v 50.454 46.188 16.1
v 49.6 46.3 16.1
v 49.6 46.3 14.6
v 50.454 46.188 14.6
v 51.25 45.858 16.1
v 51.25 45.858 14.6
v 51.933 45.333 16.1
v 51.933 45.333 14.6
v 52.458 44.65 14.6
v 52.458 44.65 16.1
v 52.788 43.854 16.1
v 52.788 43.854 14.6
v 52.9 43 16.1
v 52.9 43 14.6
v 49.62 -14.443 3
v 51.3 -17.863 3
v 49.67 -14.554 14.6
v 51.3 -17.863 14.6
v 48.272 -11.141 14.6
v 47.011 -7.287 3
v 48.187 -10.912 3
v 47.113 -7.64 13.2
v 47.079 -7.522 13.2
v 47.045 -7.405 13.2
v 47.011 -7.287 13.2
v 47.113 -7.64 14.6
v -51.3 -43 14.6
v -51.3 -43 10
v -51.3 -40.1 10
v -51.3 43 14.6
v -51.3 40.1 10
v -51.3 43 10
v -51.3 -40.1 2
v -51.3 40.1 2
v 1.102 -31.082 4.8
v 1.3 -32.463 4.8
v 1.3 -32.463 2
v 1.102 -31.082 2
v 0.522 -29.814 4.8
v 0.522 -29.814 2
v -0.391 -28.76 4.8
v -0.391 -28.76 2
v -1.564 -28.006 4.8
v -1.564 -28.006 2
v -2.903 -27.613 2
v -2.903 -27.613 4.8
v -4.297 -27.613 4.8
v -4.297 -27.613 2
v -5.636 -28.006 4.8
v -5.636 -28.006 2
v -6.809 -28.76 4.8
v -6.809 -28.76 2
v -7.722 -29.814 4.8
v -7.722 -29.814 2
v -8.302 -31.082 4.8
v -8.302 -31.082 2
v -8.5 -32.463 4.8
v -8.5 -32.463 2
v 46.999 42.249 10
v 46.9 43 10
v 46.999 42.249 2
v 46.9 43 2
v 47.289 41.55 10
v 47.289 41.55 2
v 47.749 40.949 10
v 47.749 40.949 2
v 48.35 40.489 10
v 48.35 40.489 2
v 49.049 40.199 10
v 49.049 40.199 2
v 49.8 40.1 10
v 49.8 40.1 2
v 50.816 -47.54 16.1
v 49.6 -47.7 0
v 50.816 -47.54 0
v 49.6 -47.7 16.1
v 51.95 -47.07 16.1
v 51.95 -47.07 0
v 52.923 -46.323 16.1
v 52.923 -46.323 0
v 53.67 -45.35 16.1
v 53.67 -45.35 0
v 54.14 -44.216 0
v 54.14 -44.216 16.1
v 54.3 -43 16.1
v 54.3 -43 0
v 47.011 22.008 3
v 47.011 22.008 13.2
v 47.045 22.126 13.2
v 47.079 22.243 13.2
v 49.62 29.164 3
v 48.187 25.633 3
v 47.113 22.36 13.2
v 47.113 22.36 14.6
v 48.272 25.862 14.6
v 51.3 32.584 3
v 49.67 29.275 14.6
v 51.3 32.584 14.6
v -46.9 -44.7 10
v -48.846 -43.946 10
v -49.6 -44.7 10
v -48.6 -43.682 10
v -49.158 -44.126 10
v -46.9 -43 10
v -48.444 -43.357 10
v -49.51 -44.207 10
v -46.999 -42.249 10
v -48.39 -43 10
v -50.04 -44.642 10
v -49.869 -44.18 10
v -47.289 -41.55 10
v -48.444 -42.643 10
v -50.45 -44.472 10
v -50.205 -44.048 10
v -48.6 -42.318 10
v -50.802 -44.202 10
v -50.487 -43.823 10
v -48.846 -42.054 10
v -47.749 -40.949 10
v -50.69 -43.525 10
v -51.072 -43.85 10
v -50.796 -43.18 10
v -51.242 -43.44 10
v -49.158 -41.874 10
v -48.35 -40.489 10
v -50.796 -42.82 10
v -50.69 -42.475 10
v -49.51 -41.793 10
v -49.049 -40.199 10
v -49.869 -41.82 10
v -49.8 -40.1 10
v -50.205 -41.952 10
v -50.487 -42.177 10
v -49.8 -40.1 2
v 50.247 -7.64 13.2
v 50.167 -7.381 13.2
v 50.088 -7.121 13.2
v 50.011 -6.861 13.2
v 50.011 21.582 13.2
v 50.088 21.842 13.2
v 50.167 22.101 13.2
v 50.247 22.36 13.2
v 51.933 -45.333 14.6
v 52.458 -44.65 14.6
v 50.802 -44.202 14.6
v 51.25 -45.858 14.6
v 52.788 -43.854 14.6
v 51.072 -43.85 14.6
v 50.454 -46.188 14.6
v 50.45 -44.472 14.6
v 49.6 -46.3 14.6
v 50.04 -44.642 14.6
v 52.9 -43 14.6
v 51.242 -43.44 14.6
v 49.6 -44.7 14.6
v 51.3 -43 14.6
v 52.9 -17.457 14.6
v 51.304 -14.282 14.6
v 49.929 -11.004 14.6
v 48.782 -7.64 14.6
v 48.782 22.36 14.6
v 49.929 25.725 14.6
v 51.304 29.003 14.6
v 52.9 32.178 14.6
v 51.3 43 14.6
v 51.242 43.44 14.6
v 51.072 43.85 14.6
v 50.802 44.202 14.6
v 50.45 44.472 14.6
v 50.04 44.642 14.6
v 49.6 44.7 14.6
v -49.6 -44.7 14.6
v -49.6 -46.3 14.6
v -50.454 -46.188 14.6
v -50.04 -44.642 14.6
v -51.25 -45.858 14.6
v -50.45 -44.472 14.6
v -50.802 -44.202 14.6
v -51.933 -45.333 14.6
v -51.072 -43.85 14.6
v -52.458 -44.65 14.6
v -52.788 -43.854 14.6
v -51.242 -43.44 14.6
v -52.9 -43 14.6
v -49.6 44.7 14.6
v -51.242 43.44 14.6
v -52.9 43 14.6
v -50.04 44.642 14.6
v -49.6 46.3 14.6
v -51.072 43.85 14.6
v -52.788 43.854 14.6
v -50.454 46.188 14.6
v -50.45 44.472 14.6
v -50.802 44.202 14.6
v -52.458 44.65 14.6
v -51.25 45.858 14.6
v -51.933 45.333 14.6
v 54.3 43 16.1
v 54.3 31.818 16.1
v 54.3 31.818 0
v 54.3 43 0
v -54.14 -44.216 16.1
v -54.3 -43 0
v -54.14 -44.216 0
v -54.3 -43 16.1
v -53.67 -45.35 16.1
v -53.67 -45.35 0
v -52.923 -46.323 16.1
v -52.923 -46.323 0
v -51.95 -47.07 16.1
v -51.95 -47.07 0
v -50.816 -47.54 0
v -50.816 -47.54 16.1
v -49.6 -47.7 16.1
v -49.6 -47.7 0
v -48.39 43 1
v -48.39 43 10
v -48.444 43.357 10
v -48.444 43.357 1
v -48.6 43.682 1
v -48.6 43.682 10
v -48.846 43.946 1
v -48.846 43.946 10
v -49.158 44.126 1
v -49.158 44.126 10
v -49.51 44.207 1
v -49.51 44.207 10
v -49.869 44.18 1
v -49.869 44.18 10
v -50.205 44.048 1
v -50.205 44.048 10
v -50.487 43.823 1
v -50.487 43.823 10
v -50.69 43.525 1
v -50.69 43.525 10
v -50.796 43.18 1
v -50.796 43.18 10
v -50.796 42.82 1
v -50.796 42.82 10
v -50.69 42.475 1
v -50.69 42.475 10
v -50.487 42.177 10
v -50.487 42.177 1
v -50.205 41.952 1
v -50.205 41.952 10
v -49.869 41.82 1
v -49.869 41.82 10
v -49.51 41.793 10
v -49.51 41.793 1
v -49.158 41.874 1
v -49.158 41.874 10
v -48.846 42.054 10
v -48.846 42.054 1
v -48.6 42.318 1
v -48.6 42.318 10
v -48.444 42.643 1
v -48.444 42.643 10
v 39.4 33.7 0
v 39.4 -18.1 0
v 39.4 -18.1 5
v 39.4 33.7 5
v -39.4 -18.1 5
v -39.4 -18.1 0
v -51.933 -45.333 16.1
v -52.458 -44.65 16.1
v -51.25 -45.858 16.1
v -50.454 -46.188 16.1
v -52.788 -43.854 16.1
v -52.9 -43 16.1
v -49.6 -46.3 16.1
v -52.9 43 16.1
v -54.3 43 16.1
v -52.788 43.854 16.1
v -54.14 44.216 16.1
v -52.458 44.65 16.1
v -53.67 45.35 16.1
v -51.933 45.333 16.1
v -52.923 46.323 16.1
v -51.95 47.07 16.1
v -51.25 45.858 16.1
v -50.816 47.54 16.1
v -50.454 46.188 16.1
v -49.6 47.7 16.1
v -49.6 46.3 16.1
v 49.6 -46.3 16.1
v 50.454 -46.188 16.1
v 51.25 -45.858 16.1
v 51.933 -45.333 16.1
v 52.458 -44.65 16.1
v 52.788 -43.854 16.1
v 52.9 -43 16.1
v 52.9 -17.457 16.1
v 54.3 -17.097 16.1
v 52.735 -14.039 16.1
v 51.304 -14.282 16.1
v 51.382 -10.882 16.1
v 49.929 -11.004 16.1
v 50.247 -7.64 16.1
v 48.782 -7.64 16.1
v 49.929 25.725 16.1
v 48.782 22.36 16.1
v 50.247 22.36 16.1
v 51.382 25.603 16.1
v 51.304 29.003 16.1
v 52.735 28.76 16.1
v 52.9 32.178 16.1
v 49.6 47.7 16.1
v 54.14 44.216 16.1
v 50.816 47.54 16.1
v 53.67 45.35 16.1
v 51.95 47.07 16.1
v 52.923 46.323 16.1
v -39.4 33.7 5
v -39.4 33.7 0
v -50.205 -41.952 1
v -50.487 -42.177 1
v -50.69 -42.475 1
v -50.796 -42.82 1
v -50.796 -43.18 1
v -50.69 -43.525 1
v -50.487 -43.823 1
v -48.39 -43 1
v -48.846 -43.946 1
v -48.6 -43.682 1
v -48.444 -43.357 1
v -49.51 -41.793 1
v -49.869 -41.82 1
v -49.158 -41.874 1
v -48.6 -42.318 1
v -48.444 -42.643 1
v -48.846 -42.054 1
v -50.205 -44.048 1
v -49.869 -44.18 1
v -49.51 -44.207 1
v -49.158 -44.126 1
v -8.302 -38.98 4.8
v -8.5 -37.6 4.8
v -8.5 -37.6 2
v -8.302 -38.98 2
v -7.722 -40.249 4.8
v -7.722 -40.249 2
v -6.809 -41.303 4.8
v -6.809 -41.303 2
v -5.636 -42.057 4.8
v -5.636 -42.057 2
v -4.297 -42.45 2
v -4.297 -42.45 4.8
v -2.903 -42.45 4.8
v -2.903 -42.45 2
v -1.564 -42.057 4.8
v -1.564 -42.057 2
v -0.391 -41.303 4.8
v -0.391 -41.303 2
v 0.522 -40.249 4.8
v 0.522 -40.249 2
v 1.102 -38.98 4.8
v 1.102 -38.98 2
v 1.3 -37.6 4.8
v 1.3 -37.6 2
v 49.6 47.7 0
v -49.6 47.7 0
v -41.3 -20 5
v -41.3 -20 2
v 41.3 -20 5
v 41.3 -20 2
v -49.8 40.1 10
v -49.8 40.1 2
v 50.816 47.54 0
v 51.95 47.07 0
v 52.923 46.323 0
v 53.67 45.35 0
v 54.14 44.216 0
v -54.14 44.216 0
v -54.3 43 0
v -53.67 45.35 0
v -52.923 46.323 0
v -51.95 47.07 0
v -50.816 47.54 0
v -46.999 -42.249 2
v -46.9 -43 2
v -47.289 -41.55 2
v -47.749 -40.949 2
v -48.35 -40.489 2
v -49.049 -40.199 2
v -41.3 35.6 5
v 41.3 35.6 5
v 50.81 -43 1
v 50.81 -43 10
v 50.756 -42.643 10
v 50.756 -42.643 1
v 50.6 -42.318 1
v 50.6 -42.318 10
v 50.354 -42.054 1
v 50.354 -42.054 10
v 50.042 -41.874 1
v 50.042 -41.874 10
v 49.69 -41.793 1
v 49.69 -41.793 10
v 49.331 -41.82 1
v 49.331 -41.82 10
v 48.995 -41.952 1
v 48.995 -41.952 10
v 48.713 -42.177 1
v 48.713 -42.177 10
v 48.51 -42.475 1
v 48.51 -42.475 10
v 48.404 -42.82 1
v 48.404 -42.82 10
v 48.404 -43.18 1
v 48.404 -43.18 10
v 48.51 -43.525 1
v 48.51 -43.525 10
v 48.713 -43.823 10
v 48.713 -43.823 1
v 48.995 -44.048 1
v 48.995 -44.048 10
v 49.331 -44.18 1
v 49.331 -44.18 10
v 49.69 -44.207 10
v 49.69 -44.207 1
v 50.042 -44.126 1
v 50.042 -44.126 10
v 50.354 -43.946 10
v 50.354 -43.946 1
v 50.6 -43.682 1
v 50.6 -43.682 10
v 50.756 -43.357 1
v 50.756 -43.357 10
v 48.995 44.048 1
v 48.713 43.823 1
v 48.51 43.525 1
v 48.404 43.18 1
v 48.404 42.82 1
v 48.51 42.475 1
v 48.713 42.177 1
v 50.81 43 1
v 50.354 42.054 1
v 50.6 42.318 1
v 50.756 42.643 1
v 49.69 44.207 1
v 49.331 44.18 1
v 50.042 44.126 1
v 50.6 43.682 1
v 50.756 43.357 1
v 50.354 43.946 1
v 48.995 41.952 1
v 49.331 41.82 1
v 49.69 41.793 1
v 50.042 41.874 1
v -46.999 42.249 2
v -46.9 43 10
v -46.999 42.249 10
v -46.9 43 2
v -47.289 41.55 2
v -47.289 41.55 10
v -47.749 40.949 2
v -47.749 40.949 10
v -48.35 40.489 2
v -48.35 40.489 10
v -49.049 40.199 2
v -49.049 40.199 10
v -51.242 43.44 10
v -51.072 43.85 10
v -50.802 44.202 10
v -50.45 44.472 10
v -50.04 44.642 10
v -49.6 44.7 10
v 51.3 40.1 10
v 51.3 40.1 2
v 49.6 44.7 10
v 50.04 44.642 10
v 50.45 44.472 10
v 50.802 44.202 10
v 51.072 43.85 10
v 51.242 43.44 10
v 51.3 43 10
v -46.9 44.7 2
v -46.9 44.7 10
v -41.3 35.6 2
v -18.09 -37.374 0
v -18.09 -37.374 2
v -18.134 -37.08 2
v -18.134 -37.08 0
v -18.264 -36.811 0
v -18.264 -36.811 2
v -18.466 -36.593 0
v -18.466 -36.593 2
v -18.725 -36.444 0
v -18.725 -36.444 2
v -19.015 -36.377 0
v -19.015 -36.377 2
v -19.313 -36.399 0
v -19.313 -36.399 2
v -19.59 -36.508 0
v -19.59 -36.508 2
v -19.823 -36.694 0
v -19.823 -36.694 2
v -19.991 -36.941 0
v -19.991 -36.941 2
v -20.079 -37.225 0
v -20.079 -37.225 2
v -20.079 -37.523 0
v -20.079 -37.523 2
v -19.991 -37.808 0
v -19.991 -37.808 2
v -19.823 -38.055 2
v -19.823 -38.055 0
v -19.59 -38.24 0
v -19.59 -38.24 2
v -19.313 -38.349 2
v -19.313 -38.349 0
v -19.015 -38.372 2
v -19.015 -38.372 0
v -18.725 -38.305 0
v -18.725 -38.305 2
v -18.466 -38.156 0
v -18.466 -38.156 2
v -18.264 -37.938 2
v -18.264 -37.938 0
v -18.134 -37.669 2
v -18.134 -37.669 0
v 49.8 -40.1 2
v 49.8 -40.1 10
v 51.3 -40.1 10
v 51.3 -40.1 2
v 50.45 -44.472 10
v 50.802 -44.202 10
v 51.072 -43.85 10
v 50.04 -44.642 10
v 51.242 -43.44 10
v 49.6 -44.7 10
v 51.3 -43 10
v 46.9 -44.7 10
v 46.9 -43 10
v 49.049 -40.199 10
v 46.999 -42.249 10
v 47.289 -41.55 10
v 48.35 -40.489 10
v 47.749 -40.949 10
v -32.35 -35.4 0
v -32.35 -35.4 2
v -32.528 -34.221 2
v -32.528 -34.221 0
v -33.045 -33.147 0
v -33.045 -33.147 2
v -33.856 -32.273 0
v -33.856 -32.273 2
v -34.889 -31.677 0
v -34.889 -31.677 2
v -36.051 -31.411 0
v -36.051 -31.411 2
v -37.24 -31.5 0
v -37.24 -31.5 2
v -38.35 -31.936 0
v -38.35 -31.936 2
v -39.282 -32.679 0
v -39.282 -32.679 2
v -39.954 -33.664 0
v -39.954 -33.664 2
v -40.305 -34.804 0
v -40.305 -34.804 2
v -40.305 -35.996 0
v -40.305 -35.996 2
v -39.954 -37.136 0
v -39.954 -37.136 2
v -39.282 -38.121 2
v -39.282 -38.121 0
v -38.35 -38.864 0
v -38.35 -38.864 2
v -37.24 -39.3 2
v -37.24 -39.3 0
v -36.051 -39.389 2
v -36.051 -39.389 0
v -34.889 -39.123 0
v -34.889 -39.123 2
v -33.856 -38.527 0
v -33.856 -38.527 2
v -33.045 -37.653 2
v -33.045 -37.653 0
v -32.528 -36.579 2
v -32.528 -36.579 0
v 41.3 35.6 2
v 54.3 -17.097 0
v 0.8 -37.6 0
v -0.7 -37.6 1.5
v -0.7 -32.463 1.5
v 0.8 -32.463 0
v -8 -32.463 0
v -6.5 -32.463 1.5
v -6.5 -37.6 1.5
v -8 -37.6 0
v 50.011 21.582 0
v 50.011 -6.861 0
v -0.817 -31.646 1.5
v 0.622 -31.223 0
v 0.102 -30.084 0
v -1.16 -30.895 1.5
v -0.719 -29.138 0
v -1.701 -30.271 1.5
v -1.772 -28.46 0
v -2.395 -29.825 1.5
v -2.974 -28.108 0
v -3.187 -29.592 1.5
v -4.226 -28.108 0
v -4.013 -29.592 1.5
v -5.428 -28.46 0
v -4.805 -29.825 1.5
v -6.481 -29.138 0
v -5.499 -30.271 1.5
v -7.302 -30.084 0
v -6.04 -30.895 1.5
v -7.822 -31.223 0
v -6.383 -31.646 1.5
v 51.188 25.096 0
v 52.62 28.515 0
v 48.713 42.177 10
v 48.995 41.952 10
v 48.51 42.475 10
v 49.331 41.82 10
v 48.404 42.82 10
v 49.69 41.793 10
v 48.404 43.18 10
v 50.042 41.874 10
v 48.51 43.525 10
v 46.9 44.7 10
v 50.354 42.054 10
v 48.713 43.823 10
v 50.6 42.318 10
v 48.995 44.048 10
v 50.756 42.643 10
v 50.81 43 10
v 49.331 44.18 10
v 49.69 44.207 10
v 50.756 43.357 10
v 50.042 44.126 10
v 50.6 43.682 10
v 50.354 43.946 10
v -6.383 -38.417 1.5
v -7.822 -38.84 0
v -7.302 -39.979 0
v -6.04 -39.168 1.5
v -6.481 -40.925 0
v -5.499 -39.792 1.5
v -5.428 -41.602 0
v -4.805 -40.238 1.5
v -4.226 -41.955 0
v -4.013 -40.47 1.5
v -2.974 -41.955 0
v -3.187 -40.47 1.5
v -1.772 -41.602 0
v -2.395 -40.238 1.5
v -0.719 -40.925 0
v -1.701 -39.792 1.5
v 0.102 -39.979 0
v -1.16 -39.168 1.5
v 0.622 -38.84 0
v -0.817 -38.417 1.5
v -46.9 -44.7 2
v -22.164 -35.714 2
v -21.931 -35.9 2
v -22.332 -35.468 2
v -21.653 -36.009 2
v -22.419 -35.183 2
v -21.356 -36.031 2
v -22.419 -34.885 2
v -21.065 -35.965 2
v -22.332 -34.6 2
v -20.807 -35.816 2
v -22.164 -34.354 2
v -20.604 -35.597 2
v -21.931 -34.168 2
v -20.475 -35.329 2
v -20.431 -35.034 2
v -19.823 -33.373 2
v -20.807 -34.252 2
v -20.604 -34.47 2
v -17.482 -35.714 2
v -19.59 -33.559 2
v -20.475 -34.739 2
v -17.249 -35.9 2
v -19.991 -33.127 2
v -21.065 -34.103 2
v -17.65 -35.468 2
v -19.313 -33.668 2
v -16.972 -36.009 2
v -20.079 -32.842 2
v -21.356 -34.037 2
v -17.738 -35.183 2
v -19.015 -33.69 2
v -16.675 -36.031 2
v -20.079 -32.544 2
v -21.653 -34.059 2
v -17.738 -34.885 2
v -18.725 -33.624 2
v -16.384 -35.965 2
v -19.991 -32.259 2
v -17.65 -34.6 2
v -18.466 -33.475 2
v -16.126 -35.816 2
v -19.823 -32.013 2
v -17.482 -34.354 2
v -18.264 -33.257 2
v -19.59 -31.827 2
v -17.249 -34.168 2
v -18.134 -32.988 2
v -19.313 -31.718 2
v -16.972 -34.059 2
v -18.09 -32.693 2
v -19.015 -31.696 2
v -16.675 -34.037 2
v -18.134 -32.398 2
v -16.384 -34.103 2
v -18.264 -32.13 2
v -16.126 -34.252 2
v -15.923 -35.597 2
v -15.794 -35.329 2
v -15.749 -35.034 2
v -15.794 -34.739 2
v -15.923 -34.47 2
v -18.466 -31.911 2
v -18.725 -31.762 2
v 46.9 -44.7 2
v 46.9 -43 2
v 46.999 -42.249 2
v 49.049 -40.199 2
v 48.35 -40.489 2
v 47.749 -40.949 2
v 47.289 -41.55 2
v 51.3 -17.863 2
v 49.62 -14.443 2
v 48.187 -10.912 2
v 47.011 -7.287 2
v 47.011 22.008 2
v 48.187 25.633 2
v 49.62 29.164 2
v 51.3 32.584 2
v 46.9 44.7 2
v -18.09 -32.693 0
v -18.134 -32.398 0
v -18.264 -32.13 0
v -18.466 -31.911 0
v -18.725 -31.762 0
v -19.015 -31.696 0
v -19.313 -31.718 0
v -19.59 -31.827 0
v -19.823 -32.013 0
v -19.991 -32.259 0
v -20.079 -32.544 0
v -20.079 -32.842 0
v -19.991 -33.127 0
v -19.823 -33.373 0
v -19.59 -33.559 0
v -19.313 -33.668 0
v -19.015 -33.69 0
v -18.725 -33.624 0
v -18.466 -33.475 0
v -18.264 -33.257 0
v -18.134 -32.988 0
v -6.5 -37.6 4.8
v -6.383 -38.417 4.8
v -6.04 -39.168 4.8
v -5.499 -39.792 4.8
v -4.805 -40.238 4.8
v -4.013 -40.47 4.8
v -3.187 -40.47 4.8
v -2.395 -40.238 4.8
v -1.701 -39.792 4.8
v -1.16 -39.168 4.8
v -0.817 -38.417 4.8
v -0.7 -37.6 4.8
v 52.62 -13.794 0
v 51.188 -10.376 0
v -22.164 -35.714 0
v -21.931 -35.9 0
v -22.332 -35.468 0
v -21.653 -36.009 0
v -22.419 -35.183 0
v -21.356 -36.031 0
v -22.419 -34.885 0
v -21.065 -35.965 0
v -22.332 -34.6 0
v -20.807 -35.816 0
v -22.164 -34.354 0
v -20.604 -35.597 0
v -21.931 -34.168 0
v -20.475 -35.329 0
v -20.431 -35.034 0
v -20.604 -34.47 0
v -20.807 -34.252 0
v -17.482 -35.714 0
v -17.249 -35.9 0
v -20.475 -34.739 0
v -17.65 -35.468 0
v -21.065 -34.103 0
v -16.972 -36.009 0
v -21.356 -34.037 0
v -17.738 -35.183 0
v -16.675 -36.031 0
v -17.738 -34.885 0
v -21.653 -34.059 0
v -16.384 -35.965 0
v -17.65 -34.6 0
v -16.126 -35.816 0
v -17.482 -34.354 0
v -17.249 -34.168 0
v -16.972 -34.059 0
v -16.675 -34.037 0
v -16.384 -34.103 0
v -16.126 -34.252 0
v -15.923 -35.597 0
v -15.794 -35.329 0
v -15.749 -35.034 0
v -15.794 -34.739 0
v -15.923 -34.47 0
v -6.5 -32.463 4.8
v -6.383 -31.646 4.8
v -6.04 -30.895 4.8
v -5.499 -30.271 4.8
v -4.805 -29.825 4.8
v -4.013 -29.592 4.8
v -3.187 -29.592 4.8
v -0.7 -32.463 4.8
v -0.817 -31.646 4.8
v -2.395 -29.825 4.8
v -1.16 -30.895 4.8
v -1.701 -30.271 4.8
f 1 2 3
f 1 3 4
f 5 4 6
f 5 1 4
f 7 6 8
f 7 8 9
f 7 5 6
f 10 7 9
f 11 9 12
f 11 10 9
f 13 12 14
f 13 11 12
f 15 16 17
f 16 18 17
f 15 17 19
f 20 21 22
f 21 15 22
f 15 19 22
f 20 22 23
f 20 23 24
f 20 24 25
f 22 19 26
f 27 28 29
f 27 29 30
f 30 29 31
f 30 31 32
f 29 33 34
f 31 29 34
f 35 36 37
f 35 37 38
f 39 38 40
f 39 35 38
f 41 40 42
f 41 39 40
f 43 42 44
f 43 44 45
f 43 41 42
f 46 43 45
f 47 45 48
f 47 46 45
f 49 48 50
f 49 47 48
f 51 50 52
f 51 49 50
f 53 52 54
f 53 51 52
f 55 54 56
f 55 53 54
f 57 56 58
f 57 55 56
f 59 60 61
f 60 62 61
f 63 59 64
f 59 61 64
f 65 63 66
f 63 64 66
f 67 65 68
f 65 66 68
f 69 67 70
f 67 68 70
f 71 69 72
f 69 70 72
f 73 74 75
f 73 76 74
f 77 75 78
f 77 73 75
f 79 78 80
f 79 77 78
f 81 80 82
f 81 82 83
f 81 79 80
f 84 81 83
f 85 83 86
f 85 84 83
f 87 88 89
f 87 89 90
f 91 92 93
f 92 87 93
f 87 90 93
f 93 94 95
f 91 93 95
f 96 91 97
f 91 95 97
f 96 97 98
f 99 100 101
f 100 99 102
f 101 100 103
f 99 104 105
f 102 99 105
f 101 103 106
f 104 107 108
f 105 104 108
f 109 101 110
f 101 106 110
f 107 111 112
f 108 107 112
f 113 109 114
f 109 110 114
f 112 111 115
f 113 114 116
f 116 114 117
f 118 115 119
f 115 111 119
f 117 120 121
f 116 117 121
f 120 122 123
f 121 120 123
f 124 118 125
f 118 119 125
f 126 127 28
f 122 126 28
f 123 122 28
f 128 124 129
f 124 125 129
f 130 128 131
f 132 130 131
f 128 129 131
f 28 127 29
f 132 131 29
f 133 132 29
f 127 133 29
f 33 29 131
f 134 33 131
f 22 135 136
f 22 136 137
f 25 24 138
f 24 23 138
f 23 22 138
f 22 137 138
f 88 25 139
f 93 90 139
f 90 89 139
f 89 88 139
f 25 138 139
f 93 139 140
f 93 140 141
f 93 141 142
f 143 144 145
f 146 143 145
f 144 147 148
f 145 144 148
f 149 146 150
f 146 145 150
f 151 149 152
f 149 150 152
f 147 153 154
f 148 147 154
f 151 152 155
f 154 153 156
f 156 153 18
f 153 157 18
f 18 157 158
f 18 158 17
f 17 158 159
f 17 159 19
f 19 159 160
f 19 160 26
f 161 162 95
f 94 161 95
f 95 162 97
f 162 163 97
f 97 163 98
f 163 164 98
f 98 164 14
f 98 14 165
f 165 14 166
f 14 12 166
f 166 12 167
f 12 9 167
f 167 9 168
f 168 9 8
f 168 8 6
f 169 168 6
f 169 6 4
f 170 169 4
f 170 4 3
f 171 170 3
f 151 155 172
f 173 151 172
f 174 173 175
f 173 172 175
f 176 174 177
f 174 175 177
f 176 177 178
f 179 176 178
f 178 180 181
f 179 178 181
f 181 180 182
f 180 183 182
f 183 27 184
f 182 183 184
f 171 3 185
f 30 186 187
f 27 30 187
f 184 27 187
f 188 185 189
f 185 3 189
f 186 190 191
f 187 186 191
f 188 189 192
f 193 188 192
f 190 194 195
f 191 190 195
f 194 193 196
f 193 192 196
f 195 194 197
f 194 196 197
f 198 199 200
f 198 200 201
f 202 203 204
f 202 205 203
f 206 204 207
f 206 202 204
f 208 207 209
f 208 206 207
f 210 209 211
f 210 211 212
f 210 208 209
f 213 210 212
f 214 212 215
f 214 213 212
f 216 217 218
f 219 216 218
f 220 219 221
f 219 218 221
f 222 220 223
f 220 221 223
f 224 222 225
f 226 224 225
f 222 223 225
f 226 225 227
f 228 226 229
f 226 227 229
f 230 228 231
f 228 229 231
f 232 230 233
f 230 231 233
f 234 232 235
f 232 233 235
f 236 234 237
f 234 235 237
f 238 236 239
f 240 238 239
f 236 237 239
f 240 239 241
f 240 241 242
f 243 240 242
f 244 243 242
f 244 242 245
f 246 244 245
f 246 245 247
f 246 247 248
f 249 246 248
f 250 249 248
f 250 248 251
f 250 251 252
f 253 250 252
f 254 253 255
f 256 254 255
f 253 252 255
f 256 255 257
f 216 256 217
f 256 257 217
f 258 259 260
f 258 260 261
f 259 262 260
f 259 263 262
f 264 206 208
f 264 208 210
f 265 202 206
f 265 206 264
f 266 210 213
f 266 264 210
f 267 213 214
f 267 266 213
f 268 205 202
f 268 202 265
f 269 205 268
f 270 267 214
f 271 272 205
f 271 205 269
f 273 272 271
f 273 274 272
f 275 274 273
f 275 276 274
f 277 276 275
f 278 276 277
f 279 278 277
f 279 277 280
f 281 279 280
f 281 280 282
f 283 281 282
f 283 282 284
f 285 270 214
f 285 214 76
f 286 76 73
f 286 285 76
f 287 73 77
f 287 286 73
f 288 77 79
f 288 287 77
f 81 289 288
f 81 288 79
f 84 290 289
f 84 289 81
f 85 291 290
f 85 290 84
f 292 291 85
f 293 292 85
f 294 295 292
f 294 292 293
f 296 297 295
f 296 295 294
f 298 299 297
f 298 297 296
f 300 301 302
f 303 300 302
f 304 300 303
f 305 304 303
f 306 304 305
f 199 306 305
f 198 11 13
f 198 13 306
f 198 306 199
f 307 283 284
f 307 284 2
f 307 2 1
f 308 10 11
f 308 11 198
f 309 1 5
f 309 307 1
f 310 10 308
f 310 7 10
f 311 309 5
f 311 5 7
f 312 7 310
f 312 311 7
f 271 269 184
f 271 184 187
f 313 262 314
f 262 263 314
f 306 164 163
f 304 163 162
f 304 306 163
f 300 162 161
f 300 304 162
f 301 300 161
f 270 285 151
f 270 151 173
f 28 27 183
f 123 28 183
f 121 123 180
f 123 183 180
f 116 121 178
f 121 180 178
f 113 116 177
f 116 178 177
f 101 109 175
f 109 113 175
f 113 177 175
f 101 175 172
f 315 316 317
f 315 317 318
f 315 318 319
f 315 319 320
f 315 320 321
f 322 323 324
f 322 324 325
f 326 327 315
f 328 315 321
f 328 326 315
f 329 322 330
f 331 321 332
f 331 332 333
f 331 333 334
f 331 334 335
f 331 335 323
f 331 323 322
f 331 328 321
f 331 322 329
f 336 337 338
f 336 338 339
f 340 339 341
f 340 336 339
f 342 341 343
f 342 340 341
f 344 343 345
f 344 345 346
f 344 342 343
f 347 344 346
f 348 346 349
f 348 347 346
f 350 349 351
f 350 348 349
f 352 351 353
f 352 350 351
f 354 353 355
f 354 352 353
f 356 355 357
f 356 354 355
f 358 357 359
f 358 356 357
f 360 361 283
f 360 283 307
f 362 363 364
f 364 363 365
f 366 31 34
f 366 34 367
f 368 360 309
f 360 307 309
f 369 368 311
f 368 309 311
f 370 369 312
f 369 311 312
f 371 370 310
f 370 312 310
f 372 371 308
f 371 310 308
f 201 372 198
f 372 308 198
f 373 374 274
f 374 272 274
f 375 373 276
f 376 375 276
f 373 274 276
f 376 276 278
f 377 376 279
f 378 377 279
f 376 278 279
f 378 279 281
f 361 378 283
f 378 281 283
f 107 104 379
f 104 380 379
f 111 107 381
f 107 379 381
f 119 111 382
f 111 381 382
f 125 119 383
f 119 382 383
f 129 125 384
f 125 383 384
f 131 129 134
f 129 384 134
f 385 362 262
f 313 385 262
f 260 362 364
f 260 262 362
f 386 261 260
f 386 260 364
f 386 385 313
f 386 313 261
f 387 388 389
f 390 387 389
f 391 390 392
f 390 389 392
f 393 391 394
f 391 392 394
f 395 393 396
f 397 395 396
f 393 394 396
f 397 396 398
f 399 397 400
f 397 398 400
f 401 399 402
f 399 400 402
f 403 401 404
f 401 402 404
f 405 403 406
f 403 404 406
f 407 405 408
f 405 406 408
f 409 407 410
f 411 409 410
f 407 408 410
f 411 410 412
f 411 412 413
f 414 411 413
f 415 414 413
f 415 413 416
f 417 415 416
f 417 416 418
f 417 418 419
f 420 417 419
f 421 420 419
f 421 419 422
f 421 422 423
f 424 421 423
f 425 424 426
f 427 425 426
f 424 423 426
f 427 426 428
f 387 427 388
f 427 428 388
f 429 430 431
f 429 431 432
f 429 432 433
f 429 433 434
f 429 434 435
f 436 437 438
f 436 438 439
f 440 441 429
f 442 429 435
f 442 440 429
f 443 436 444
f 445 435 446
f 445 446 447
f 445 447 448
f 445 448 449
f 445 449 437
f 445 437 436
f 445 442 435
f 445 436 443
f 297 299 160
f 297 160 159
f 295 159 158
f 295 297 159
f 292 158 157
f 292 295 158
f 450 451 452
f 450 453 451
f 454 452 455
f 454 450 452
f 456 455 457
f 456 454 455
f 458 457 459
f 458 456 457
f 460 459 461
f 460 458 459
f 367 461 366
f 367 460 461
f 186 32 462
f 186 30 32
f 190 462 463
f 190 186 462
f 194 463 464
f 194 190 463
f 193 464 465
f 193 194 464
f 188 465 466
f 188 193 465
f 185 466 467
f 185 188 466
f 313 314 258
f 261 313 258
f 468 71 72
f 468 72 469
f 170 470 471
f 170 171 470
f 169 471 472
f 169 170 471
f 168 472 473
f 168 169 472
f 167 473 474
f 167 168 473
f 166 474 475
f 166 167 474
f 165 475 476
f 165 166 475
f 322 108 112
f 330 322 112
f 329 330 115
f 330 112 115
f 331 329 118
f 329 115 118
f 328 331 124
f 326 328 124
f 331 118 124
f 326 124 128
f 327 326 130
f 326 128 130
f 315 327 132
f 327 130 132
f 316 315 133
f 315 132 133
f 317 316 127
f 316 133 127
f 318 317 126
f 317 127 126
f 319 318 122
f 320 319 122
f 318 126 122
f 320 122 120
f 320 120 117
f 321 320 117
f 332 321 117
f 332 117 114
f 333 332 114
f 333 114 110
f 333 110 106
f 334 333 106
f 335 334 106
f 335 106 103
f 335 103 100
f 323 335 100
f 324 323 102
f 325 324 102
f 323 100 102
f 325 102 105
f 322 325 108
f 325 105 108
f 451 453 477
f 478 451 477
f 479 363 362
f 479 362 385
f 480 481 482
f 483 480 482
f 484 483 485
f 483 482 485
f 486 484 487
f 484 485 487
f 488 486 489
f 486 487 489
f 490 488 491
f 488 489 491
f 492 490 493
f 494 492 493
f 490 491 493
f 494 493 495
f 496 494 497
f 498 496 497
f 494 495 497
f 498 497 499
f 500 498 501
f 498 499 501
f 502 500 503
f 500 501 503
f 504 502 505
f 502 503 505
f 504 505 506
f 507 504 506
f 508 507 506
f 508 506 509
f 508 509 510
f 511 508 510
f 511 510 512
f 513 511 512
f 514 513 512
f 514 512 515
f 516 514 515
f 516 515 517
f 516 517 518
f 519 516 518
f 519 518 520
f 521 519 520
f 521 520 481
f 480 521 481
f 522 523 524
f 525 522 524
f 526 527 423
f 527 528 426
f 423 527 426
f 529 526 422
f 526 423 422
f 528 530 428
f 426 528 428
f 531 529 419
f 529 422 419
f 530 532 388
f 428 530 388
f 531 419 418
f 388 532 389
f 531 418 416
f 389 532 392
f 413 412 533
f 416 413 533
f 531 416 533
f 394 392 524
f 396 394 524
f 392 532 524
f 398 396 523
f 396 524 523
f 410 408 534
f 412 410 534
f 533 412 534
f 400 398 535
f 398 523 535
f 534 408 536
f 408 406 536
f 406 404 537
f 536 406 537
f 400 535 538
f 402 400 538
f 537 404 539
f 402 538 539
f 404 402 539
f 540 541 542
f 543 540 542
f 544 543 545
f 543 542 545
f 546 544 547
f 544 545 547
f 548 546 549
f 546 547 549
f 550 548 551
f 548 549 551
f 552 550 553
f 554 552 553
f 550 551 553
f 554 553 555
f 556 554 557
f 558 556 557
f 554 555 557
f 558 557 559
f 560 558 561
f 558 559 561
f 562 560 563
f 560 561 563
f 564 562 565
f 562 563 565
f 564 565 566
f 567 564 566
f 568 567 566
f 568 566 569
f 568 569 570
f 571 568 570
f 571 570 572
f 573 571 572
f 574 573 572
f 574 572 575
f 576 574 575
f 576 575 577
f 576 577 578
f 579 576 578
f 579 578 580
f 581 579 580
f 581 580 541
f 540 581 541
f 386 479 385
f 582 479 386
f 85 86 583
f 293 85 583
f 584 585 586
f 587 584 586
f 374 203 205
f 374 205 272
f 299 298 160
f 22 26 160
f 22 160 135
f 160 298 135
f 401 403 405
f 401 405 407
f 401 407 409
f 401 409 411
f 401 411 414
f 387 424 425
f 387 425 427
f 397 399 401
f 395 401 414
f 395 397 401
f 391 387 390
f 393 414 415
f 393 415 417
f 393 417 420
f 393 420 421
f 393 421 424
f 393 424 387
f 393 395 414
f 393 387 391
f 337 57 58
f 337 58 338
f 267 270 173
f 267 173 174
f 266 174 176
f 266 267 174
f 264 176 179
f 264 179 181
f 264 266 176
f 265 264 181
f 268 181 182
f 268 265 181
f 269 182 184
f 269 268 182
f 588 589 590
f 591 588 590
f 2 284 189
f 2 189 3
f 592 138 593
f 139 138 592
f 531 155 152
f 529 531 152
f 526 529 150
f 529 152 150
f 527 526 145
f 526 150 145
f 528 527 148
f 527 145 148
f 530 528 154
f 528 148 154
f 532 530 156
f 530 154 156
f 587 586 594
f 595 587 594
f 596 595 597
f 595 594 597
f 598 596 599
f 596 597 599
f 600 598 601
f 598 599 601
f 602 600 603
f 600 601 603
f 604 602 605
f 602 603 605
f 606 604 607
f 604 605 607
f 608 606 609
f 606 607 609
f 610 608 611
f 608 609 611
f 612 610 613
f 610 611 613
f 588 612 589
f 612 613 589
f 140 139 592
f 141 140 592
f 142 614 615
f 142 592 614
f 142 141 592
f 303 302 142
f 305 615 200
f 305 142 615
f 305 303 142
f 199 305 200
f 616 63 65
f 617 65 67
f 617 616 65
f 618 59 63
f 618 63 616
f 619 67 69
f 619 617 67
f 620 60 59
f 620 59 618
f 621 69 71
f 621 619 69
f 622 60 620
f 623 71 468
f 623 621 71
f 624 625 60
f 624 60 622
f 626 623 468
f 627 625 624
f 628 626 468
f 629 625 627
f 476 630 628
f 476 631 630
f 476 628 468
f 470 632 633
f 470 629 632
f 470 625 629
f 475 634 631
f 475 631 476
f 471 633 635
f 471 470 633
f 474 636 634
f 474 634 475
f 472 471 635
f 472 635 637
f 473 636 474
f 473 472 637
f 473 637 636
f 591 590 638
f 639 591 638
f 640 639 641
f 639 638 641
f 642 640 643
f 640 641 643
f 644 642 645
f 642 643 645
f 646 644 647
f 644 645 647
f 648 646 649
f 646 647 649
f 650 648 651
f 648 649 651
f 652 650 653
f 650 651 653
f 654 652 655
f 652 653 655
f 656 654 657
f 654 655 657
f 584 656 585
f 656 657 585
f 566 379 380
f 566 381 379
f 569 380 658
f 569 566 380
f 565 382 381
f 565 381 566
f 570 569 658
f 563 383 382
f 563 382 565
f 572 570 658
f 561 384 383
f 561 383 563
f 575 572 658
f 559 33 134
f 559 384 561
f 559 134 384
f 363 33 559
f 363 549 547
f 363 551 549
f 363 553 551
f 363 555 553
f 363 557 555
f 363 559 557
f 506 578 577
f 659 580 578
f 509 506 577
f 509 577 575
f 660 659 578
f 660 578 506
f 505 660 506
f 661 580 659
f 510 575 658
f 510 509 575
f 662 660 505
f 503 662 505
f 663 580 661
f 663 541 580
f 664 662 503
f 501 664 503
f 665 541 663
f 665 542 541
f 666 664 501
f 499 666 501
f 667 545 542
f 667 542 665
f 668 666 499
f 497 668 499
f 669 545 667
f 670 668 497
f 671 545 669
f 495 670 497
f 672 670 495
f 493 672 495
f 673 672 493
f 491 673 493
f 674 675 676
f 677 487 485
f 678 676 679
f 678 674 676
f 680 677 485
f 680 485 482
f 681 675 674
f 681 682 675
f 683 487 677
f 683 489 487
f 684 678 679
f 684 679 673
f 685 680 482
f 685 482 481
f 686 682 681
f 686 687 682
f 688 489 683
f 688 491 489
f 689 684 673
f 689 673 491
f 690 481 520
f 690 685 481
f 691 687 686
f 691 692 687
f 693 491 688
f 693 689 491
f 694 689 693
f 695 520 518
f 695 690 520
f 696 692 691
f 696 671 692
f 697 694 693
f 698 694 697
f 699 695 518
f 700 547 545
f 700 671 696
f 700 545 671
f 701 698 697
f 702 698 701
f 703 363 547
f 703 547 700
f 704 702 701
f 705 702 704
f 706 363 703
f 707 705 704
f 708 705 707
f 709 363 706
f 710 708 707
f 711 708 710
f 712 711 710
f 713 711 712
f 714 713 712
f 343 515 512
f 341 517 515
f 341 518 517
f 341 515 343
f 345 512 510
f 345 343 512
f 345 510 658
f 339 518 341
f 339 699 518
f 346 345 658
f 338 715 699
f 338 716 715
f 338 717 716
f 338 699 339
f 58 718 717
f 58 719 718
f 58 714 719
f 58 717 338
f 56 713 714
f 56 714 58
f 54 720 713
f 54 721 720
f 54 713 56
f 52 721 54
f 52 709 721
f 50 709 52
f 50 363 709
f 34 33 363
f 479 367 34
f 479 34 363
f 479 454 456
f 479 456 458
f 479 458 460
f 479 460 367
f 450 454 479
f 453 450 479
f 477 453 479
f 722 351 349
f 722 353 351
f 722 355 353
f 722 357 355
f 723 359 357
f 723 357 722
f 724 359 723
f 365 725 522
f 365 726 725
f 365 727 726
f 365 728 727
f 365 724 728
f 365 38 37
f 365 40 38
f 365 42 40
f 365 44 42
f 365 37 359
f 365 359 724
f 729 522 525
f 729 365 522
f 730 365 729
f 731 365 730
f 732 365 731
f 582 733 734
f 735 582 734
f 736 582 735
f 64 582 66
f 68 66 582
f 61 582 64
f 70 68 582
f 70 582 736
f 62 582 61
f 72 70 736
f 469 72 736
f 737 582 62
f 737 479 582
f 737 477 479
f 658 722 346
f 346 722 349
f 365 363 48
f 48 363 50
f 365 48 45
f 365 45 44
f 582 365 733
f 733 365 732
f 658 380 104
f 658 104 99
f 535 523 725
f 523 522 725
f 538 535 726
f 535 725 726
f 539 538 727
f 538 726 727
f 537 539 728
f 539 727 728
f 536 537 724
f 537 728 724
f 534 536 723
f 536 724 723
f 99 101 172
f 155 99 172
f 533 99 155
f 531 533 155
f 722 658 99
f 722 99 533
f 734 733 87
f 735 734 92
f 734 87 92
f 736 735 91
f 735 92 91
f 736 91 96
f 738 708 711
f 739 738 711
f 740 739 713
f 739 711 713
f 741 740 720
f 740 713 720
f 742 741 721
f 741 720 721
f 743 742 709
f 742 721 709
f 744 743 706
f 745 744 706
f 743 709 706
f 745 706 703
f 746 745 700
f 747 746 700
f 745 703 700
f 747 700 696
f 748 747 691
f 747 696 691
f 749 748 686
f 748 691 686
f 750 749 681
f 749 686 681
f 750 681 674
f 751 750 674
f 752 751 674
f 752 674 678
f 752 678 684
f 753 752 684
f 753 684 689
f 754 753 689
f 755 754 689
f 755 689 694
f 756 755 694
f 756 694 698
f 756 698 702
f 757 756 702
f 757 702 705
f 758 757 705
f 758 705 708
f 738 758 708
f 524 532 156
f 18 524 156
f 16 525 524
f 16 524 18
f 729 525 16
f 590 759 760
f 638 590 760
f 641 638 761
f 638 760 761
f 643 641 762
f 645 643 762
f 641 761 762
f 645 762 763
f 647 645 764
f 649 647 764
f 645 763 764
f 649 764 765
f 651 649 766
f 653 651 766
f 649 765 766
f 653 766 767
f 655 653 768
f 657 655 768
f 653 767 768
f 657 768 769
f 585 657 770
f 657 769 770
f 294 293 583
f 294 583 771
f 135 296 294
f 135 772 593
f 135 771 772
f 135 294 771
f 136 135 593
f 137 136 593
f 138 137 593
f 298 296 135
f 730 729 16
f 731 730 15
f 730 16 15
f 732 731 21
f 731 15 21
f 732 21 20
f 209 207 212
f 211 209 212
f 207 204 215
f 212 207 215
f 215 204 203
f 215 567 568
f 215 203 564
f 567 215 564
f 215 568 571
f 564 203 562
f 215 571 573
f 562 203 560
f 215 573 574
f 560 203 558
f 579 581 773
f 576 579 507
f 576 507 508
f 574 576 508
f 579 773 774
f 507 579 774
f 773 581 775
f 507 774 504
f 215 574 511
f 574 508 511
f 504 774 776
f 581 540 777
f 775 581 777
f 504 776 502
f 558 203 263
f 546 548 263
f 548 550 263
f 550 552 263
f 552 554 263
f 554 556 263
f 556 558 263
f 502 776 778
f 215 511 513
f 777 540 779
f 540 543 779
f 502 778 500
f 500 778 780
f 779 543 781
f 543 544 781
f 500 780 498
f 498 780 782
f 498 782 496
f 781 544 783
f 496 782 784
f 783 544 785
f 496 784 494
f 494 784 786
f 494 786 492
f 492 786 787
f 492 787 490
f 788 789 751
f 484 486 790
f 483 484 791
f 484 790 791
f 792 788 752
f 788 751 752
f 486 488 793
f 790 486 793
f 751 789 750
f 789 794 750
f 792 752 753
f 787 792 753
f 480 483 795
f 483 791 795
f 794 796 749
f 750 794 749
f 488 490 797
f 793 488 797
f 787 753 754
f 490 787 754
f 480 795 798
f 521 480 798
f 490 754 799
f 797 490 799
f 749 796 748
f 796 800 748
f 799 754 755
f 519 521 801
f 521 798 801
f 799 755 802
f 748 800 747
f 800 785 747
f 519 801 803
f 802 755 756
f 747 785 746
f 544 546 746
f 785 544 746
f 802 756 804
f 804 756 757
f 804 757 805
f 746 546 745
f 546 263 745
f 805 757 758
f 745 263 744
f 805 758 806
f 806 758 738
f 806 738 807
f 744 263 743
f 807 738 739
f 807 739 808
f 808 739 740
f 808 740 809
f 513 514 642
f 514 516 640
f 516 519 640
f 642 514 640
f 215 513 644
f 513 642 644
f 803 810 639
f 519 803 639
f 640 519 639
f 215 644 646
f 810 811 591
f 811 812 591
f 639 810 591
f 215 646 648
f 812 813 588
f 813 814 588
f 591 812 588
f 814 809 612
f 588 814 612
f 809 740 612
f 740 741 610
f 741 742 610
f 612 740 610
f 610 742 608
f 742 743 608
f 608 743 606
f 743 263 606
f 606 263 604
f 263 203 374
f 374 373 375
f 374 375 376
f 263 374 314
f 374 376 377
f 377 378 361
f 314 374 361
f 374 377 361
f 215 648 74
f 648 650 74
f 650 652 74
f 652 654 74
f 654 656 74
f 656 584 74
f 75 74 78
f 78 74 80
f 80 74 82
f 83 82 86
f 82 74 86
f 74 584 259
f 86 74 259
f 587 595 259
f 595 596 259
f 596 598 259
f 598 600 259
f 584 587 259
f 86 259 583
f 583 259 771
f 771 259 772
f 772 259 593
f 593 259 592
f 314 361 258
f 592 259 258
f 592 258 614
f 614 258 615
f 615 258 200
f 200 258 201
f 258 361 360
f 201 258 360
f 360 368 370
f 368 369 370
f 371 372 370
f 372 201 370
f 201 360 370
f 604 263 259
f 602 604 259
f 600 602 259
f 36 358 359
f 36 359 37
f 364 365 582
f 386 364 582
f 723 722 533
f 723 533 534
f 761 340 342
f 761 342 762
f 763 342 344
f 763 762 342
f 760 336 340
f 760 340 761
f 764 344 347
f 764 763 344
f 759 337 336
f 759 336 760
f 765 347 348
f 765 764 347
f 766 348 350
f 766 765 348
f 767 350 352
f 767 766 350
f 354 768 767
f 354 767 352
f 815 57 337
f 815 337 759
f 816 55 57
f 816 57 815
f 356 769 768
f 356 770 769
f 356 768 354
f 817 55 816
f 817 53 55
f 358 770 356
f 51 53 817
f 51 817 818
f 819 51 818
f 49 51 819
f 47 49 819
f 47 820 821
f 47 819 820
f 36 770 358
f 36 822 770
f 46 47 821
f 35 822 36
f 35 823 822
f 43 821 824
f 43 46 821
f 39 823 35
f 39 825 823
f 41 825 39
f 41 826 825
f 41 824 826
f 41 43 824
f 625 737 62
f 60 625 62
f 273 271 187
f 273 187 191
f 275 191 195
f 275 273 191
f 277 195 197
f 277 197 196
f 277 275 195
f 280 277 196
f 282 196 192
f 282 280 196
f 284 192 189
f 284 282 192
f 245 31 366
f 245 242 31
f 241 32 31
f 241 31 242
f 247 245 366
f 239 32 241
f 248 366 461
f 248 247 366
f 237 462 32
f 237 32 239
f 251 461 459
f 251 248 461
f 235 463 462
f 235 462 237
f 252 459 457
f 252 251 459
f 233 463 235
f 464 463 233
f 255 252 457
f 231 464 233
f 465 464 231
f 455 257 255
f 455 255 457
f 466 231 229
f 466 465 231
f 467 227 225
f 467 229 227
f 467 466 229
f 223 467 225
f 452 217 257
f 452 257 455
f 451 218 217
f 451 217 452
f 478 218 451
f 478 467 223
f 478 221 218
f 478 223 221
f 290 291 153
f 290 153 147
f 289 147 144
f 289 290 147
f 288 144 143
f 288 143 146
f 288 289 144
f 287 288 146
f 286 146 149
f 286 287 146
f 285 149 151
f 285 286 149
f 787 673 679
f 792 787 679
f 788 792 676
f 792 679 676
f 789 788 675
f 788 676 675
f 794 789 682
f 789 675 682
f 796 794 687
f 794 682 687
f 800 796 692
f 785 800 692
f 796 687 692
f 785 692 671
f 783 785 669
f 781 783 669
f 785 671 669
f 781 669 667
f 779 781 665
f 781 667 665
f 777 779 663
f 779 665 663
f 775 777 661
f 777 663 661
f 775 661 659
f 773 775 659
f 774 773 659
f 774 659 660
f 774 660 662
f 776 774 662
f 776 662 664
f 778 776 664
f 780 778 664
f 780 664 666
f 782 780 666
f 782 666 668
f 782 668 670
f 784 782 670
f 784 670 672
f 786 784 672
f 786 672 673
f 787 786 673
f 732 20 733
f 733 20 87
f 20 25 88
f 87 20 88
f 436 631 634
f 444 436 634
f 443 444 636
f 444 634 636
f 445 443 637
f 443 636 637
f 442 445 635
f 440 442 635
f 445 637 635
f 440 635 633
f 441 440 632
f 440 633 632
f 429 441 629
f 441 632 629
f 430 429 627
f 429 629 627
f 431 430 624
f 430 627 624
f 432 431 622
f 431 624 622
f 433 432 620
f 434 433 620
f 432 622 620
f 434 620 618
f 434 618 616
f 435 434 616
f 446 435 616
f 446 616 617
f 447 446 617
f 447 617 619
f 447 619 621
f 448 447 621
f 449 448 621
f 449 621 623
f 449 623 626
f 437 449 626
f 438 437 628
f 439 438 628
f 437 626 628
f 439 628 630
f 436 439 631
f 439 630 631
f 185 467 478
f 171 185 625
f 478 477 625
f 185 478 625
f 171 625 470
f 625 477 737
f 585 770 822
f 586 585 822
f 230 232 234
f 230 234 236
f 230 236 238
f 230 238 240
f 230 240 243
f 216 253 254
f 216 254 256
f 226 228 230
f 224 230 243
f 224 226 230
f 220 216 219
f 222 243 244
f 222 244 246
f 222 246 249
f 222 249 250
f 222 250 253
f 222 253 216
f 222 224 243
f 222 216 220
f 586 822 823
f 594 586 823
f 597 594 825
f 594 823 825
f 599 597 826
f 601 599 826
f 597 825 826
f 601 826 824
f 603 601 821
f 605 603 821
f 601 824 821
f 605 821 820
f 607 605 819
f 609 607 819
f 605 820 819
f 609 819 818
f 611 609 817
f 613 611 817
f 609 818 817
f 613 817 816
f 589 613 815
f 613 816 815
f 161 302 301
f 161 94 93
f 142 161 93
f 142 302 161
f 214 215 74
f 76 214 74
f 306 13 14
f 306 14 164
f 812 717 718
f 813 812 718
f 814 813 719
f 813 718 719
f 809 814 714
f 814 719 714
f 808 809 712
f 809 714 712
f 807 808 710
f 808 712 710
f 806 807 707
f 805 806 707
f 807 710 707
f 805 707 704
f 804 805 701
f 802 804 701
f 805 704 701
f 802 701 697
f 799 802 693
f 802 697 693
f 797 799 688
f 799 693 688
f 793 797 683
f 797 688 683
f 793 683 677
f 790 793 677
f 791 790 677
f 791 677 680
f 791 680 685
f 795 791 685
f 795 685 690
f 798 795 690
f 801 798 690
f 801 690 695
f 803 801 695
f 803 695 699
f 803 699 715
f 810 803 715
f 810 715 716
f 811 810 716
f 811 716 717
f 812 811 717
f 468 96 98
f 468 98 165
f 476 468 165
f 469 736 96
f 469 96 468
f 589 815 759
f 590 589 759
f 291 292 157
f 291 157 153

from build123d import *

# Parameters (mm, degrees)
SKETCH1_W                = 108.6
SKETCH1_H                = 95.4
BOSS_EXTRUDE1_DEPTH      = 16.1
CUT_EXTRUDE1_DEPTH       = 75.047214667
FILLET1_R                = 4.7
SHELL1_T                 = -3
SHELL1_THICKNESS_2_DEPTH = 1
CUT_EXTRUDE2_DEPTH       = 1.5
SKETCH4_W                = 78.8
SKETCH4_H                = 51.8
CUT_EXTRUDE3_DEPTH       = 74.63823735
SKETCH5_W                = 82.6
SKETCH5_H                = 55.6
SKETCH5_W_2              = 78.8
SKETCH5_H_2              = 51.8
BOSS_EXTRUDE2_DEPTH      = 3
SKETCH6_R                = 4
SKETCH6_R_2              = 1
CUT_EXTRUDE4_DEPTH       = 74.63823735
BOSS_EXTRUDE3_START      = 2.8
BOSS_EXTRUDE3_DEPTH      = 2.8
CHAMFER1_SIZE            = 1.5
CUT_EXTRUDE5_REACH       = 121.702
SKETCH8_W                = 2.9
SKETCH8_H                = 30
BOSS_EXTRUDE4_START      = 8
BOSS_EXTRUDE4_DEPTH      = 8
FILLET2_R                = 2.9
SKETCH10_R               = 1.21
CUT_EXTRUDE6_DEPTH       = 9


with BuildPart() as part:
    # Sketch1 → Boss-Extrude1 (new body)
    with BuildSketch(Plane.XY):
        Rectangle(SKETCH1_W, SKETCH1_H)
    extrude(amount=BOSS_EXTRUDE1_DEPTH)

    # Sketch2 → Cut-Extrude1 (cut, through all)
    with BuildSketch(Plane.XY.offset(16.1)):
        with BuildLine():
            Line((50.011, -6.861266451), (50.011, 21.582126451))
            ThreePointArc((50.011, 21.582126451), (148.66075, 7.36043), (50.011, -6.861266451))
        make_face()
    extrude(amount=-CUT_EXTRUDE1_DEPTH, mode=Mode.SUBTRACT)

    # Fillet1
    fillet1_edges = [part.edges().sort_by_distance(p)[0] for p in [
        (54.3, -47.7, 8.05),
        (-54.3, -47.7, 8.05),
        (-54.3, 47.7, 8.05),
        (54.3, 47.7, 8.05),
    ]]
    fillet(fillet1_edges, radius=FILLET1_R)

    # Shell1
    shell1_openings = [part.faces().sort_by_distance(p)[0] for p in [
        (-0.877010034, -0.123339484, 16.1),
    ]]
    offset(amount=SHELL1_T, openings=shell1_openings, kind=Kind.INTERSECTION)

    # Shell1 thickness 2 face (on inner face of the shell) → Shell1 thickness 2 (cut)
    with BuildSketch(Plane(origin=(-0.963593996, -0.143755332, 3), x_dir=(-1, 0, 0), z_dir=(0, 0, -1))):
        with BuildLine():
            Line((50.336406004, 43.143755332), (50.336406004, -42.856244668))
            ThreePointArc((50.336406004, -42.856244668), (49.838487532, -44.058326196), (48.636406004, -44.556244668))
            Line((48.636406004, -44.556244668), (-50.563593996, -44.556244668))
            ThreePointArc((-50.563593996, -44.556244668), (-51.765675524, -44.058326196), (-52.263593996, -42.856244668))
            Line((-52.263593996, -42.856244668), (-52.263593996, -17.719055626))
            ThreePointArc((-52.263593996, -17.719055626), (-49.835507324, -12.546349038), (-47.974593996, -7.143618255))
            Line((-47.974593996, -7.143618255), (-47.974593996, 22.151988919))
            ThreePointArc((-47.974593996, 22.151988919), (-49.835507324, 27.554719702), (-52.263593996, 32.72742629))
            Line((-52.263593996, 32.72742629), (-52.263593996, 43.143755332))
            ThreePointArc((-52.263593996, 43.143755332), (-51.765675524, 44.34583686), (-50.563593996, 44.843755332))
            Line((-50.563593996, 44.843755332), (48.636406004, 44.843755332))
            ThreePointArc((48.636406004, 44.843755332), (49.838487532, 44.34583686), (50.336406004, 43.143755332))
        make_face()
    extrude(amount=SHELL1_THICKNESS_2_DEPTH, mode=Mode.SUBTRACT)

    # Sketch3 → Cut-Extrude2 (cut)
    with BuildSketch(Plane.XY.offset(16.1)):
        with BuildLine():
            Line((-51.3, 43), (-51.3, -43))
            ThreePointArc((-51.3, -43), (-50.802081528, -44.202081528), (-49.6, -44.7))
            Line((-49.6, -44.7), (49.6, -44.7))
            ThreePointArc((49.6, -44.7), (50.802081528, -44.202081528), (51.3, -43))
            Line((51.3, -43), (51.3, -17.862810958))
            ThreePointArc((51.3, -17.862810958), (48.786619627, -12.478496653), (46.887595336, -6.84807676))
            Line((46.887595336, -6.84807676), (48.549511715, -6.84807676))
            ThreePointArc((48.549511715, -6.84807676), (50.429997664, -12.273623472), (52.9, -17.457432205))
            Line((52.9, -17.457432205), (52.9, -43))
            ThreePointArc((52.9, -43), (51.933452378, -45.333452378), (49.6, -46.3))
            Line((49.6, -46.3), (-49.6, -46.3))
            ThreePointArc((-49.6, -46.3), (-51.933452378, -45.333452378), (-52.9, -43))
            Line((-52.9, -43), (-52.9, 43))
            ThreePointArc((-52.9, 43), (-51.933452378, 45.333452378), (-49.6, 46.3))
            Line((-49.6, 46.3), (49.6, 46.3))
            ThreePointArc((49.6, 46.3), (51.933452378, 45.333452378), (52.9, 43))
            Line((52.9, 43), (52.9, 32.178292205))
            ThreePointArc((52.9, 32.178292205), (50.429997664, 26.994483472), (48.549511715, 21.56893676))
            Line((48.549511715, 21.56893676), (46.887595336, 21.56893676))
            ThreePointArc((46.887595336, 21.56893676), (48.786619627, 27.199356653), (51.3, 32.583670958))
            Line((51.3, 32.583670958), (51.3, 43))
            ThreePointArc((51.3, 43), (50.802081528, 44.202081528), (49.6, 44.7))
            Line((49.6, 44.7), (-49.6, 44.7))
            ThreePointArc((-49.6, 44.7), (-50.802081528, 44.202081528), (-51.3, 43))
        make_face()
    extrude(amount=-CUT_EXTRUDE2_DEPTH, mode=Mode.SUBTRACT)

    # Sketch4 → Cut-Extrude3 (cut, through all)
    with BuildSketch(Plane.XY.offset(2)):
        with Locations((0, 7.8)):
            Rectangle(SKETCH4_W, SKETCH4_H)
    extrude(amount=-CUT_EXTRUDE3_DEPTH, mode=Mode.SUBTRACT)

    # Sketch5 → Boss-Extrude2 (add)
    with BuildSketch(Plane.XY.offset(2)):
        with Locations((0, 7.8)):
            Rectangle(SKETCH5_W, SKETCH5_H)
        with Locations((0, 7.8)):
            Rectangle(SKETCH5_W_2, SKETCH5_H_2, mode=Mode.SUBTRACT)
    extrude(amount=BOSS_EXTRUDE2_DEPTH)

    # Sketch6 → Cut-Extrude4 (cut, through all)
    with BuildSketch(Plane.XY.offset(2)):
        with Locations((-36.35, -35.4)):
            Circle(SKETCH6_R)
        with Locations((-19.08998, -32.69324)):
            Circle(SKETCH6_R_2)
        with Locations((-19.08998, -37.3744)):
            Circle(SKETCH6_R_2)
        with Locations((-21.43056, -35.03382)):
            Circle(SKETCH6_R_2)
        with Locations((-16.7494, -35.03382)):
            Circle(SKETCH6_R_2)
        with BuildLine():
            Line((-0.7, -32.46283), (-0.7, -37.6))
            ThreePointArc((-0.7, -37.6), (-3.6, -40.5), (-6.5, -37.6))
            Line((-6.5, -37.6), (-6.5, -32.46283))
            ThreePointArc((-6.5, -32.46283), (-3.6, -29.56283), (-0.7, -32.46283))
        make_face()
    extrude(amount=-CUT_EXTRUDE4_DEPTH, mode=Mode.SUBTRACT)

    # Sketch7 → Boss-Extrude3 (add)
    with BuildSketch(Plane.XY.offset(2).offset(BOSS_EXTRUDE3_START)):
        with BuildLine():
            Line((-8.5, -32.46283), (-8.5, -37.6))
            ThreePointArc((-8.5, -37.6), (-3.6, -42.5), (1.3, -37.6))
            Line((1.3, -37.6), (1.3, -32.46283))
            ThreePointArc((1.3, -32.46283), (-3.6, -27.56283), (-8.5, -32.46283))
        make_face()
        with BuildLine():
            Line((-6.5, -32.46283), (-6.5, -37.6))
            ThreePointArc((-6.5, -37.6), (-3.6, -40.5), (-0.7, -37.6))
            Line((-0.7, -37.6), (-0.7, -32.46283))
            ThreePointArc((-0.7, -32.46283), (-3.6, -29.56283), (-6.5, -32.46283))
        make_face(mode=Mode.SUBTRACT)
    extrude(amount=-BOSS_EXTRUDE3_DEPTH)

    # Chamfer1
    chamfer1_edges = [part.edges().sort_by_distance(p)[0] for p in [
        (-3.6, -29.56283, 0),
        (-0.7, -35.031415, 0),
        (-3.6, -40.5, 0),
        (-6.5, -35.031415, 0),
    ]]
    chamfer(chamfer1_edges, length=CHAMFER1_SIZE)

    # Sketch8 → Cut-Extrude5 (cut, up to next)
    with BuildSketch(Plane(origin=(54.3, 0, 0), x_dir=(0, 0, -1), z_dir=(1, 0, 0)), mode=Mode.PRIVATE) as cut_extrude5_sk1:
        with Locations((-14.65, 7.36043)):
            Rectangle(SKETCH8_W, SKETCH8_H)
    cut_extrude5_tool1 = extrude(cut_extrude5_sk1.sketch, amount=-CUT_EXTRUDE5_REACH, mode=Mode.PRIVATE) & part.part
    add(cut_extrude5_tool1.solids().sort_by_distance((54.3, 7.36043, 14.65))[0], mode=Mode.SUBTRACT)

    # Sketch9 → Boss-Extrude4 (add)
    with BuildSketch(Plane.XY.offset(2).offset(BOSS_EXTRUDE4_START)):
        with BuildLine():
            Line((49.6, 44.7), (46.9, 44.7))
            Line((46.9, 44.7), (46.9, 40.1))
            Line((46.9, 40.1), (51.3, 40.1))
            Line((51.3, 40.1), (51.3, 43))
            ThreePointArc((51.3, 43), (50.802081528, 44.202081528), (49.6, 44.7))
        make_face()
        with BuildLine():
            Line((-51.3, 40.1), (-46.9, 40.1))
            Line((-46.9, 40.1), (-46.9, 44.7))
            Line((-46.9, 44.7), (-49.6, 44.7))
            ThreePointArc((-49.6, 44.7), (-50.802081528, 44.202081528), (-51.3, 43))
            Line((-51.3, 43), (-51.3, 40.1))
        make_face()
        with BuildLine():
            Line((-51.3, -43), (-51.3, -40.1))
            Line((-51.3, -40.1), (-46.9, -40.1))
            Line((-46.9, -40.1), (-46.9, -44.7))
            Line((-46.9, -44.7), (-49.6, -44.7))
            ThreePointArc((-49.6, -44.7), (-50.802081528, -44.202081528), (-51.3, -43))
        make_face()
        with BuildLine():
            Line((49.6, -44.7), (46.9, -44.7))
            Line((46.9, -44.7), (46.9, -40.1))
            Line((46.9, -40.1), (51.3, -40.1))
            Line((51.3, -40.1), (51.3, -43))
            ThreePointArc((51.3, -43), (50.802081528, -44.202081528), (49.6, -44.7))
        make_face()
    extrude(amount=-BOSS_EXTRUDE4_DEPTH)

    # Fillet2
    fillet2_edges = [part.edges().sort_by_distance(p)[0] for p in [
        (-46.9, 40.1, 6),
        (46.9, 40.1, 6),
        (46.9, -40.1, 6),
        (-46.9, -40.1, 6),
    ]]
    fillet(fillet2_edges, radius=FILLET2_R)

    # Sketch10 → Cut-Extrude6 (cut)
    with BuildSketch(Plane.XY.offset(10)):
        with Locations((-49.6, 43)):
            Circle(SKETCH10_R)
        with Locations((49.6, 43)):
            Circle(SKETCH10_R)
        with Locations((49.6, -43)):
            Circle(SKETCH10_R)
        with Locations((-49.6, -43)):
            Circle(SKETCH10_R)
    extrude(amount=-CUT_EXTRUDE6_DEPTH, mode=Mode.SUBTRACT)


solid = part.part
